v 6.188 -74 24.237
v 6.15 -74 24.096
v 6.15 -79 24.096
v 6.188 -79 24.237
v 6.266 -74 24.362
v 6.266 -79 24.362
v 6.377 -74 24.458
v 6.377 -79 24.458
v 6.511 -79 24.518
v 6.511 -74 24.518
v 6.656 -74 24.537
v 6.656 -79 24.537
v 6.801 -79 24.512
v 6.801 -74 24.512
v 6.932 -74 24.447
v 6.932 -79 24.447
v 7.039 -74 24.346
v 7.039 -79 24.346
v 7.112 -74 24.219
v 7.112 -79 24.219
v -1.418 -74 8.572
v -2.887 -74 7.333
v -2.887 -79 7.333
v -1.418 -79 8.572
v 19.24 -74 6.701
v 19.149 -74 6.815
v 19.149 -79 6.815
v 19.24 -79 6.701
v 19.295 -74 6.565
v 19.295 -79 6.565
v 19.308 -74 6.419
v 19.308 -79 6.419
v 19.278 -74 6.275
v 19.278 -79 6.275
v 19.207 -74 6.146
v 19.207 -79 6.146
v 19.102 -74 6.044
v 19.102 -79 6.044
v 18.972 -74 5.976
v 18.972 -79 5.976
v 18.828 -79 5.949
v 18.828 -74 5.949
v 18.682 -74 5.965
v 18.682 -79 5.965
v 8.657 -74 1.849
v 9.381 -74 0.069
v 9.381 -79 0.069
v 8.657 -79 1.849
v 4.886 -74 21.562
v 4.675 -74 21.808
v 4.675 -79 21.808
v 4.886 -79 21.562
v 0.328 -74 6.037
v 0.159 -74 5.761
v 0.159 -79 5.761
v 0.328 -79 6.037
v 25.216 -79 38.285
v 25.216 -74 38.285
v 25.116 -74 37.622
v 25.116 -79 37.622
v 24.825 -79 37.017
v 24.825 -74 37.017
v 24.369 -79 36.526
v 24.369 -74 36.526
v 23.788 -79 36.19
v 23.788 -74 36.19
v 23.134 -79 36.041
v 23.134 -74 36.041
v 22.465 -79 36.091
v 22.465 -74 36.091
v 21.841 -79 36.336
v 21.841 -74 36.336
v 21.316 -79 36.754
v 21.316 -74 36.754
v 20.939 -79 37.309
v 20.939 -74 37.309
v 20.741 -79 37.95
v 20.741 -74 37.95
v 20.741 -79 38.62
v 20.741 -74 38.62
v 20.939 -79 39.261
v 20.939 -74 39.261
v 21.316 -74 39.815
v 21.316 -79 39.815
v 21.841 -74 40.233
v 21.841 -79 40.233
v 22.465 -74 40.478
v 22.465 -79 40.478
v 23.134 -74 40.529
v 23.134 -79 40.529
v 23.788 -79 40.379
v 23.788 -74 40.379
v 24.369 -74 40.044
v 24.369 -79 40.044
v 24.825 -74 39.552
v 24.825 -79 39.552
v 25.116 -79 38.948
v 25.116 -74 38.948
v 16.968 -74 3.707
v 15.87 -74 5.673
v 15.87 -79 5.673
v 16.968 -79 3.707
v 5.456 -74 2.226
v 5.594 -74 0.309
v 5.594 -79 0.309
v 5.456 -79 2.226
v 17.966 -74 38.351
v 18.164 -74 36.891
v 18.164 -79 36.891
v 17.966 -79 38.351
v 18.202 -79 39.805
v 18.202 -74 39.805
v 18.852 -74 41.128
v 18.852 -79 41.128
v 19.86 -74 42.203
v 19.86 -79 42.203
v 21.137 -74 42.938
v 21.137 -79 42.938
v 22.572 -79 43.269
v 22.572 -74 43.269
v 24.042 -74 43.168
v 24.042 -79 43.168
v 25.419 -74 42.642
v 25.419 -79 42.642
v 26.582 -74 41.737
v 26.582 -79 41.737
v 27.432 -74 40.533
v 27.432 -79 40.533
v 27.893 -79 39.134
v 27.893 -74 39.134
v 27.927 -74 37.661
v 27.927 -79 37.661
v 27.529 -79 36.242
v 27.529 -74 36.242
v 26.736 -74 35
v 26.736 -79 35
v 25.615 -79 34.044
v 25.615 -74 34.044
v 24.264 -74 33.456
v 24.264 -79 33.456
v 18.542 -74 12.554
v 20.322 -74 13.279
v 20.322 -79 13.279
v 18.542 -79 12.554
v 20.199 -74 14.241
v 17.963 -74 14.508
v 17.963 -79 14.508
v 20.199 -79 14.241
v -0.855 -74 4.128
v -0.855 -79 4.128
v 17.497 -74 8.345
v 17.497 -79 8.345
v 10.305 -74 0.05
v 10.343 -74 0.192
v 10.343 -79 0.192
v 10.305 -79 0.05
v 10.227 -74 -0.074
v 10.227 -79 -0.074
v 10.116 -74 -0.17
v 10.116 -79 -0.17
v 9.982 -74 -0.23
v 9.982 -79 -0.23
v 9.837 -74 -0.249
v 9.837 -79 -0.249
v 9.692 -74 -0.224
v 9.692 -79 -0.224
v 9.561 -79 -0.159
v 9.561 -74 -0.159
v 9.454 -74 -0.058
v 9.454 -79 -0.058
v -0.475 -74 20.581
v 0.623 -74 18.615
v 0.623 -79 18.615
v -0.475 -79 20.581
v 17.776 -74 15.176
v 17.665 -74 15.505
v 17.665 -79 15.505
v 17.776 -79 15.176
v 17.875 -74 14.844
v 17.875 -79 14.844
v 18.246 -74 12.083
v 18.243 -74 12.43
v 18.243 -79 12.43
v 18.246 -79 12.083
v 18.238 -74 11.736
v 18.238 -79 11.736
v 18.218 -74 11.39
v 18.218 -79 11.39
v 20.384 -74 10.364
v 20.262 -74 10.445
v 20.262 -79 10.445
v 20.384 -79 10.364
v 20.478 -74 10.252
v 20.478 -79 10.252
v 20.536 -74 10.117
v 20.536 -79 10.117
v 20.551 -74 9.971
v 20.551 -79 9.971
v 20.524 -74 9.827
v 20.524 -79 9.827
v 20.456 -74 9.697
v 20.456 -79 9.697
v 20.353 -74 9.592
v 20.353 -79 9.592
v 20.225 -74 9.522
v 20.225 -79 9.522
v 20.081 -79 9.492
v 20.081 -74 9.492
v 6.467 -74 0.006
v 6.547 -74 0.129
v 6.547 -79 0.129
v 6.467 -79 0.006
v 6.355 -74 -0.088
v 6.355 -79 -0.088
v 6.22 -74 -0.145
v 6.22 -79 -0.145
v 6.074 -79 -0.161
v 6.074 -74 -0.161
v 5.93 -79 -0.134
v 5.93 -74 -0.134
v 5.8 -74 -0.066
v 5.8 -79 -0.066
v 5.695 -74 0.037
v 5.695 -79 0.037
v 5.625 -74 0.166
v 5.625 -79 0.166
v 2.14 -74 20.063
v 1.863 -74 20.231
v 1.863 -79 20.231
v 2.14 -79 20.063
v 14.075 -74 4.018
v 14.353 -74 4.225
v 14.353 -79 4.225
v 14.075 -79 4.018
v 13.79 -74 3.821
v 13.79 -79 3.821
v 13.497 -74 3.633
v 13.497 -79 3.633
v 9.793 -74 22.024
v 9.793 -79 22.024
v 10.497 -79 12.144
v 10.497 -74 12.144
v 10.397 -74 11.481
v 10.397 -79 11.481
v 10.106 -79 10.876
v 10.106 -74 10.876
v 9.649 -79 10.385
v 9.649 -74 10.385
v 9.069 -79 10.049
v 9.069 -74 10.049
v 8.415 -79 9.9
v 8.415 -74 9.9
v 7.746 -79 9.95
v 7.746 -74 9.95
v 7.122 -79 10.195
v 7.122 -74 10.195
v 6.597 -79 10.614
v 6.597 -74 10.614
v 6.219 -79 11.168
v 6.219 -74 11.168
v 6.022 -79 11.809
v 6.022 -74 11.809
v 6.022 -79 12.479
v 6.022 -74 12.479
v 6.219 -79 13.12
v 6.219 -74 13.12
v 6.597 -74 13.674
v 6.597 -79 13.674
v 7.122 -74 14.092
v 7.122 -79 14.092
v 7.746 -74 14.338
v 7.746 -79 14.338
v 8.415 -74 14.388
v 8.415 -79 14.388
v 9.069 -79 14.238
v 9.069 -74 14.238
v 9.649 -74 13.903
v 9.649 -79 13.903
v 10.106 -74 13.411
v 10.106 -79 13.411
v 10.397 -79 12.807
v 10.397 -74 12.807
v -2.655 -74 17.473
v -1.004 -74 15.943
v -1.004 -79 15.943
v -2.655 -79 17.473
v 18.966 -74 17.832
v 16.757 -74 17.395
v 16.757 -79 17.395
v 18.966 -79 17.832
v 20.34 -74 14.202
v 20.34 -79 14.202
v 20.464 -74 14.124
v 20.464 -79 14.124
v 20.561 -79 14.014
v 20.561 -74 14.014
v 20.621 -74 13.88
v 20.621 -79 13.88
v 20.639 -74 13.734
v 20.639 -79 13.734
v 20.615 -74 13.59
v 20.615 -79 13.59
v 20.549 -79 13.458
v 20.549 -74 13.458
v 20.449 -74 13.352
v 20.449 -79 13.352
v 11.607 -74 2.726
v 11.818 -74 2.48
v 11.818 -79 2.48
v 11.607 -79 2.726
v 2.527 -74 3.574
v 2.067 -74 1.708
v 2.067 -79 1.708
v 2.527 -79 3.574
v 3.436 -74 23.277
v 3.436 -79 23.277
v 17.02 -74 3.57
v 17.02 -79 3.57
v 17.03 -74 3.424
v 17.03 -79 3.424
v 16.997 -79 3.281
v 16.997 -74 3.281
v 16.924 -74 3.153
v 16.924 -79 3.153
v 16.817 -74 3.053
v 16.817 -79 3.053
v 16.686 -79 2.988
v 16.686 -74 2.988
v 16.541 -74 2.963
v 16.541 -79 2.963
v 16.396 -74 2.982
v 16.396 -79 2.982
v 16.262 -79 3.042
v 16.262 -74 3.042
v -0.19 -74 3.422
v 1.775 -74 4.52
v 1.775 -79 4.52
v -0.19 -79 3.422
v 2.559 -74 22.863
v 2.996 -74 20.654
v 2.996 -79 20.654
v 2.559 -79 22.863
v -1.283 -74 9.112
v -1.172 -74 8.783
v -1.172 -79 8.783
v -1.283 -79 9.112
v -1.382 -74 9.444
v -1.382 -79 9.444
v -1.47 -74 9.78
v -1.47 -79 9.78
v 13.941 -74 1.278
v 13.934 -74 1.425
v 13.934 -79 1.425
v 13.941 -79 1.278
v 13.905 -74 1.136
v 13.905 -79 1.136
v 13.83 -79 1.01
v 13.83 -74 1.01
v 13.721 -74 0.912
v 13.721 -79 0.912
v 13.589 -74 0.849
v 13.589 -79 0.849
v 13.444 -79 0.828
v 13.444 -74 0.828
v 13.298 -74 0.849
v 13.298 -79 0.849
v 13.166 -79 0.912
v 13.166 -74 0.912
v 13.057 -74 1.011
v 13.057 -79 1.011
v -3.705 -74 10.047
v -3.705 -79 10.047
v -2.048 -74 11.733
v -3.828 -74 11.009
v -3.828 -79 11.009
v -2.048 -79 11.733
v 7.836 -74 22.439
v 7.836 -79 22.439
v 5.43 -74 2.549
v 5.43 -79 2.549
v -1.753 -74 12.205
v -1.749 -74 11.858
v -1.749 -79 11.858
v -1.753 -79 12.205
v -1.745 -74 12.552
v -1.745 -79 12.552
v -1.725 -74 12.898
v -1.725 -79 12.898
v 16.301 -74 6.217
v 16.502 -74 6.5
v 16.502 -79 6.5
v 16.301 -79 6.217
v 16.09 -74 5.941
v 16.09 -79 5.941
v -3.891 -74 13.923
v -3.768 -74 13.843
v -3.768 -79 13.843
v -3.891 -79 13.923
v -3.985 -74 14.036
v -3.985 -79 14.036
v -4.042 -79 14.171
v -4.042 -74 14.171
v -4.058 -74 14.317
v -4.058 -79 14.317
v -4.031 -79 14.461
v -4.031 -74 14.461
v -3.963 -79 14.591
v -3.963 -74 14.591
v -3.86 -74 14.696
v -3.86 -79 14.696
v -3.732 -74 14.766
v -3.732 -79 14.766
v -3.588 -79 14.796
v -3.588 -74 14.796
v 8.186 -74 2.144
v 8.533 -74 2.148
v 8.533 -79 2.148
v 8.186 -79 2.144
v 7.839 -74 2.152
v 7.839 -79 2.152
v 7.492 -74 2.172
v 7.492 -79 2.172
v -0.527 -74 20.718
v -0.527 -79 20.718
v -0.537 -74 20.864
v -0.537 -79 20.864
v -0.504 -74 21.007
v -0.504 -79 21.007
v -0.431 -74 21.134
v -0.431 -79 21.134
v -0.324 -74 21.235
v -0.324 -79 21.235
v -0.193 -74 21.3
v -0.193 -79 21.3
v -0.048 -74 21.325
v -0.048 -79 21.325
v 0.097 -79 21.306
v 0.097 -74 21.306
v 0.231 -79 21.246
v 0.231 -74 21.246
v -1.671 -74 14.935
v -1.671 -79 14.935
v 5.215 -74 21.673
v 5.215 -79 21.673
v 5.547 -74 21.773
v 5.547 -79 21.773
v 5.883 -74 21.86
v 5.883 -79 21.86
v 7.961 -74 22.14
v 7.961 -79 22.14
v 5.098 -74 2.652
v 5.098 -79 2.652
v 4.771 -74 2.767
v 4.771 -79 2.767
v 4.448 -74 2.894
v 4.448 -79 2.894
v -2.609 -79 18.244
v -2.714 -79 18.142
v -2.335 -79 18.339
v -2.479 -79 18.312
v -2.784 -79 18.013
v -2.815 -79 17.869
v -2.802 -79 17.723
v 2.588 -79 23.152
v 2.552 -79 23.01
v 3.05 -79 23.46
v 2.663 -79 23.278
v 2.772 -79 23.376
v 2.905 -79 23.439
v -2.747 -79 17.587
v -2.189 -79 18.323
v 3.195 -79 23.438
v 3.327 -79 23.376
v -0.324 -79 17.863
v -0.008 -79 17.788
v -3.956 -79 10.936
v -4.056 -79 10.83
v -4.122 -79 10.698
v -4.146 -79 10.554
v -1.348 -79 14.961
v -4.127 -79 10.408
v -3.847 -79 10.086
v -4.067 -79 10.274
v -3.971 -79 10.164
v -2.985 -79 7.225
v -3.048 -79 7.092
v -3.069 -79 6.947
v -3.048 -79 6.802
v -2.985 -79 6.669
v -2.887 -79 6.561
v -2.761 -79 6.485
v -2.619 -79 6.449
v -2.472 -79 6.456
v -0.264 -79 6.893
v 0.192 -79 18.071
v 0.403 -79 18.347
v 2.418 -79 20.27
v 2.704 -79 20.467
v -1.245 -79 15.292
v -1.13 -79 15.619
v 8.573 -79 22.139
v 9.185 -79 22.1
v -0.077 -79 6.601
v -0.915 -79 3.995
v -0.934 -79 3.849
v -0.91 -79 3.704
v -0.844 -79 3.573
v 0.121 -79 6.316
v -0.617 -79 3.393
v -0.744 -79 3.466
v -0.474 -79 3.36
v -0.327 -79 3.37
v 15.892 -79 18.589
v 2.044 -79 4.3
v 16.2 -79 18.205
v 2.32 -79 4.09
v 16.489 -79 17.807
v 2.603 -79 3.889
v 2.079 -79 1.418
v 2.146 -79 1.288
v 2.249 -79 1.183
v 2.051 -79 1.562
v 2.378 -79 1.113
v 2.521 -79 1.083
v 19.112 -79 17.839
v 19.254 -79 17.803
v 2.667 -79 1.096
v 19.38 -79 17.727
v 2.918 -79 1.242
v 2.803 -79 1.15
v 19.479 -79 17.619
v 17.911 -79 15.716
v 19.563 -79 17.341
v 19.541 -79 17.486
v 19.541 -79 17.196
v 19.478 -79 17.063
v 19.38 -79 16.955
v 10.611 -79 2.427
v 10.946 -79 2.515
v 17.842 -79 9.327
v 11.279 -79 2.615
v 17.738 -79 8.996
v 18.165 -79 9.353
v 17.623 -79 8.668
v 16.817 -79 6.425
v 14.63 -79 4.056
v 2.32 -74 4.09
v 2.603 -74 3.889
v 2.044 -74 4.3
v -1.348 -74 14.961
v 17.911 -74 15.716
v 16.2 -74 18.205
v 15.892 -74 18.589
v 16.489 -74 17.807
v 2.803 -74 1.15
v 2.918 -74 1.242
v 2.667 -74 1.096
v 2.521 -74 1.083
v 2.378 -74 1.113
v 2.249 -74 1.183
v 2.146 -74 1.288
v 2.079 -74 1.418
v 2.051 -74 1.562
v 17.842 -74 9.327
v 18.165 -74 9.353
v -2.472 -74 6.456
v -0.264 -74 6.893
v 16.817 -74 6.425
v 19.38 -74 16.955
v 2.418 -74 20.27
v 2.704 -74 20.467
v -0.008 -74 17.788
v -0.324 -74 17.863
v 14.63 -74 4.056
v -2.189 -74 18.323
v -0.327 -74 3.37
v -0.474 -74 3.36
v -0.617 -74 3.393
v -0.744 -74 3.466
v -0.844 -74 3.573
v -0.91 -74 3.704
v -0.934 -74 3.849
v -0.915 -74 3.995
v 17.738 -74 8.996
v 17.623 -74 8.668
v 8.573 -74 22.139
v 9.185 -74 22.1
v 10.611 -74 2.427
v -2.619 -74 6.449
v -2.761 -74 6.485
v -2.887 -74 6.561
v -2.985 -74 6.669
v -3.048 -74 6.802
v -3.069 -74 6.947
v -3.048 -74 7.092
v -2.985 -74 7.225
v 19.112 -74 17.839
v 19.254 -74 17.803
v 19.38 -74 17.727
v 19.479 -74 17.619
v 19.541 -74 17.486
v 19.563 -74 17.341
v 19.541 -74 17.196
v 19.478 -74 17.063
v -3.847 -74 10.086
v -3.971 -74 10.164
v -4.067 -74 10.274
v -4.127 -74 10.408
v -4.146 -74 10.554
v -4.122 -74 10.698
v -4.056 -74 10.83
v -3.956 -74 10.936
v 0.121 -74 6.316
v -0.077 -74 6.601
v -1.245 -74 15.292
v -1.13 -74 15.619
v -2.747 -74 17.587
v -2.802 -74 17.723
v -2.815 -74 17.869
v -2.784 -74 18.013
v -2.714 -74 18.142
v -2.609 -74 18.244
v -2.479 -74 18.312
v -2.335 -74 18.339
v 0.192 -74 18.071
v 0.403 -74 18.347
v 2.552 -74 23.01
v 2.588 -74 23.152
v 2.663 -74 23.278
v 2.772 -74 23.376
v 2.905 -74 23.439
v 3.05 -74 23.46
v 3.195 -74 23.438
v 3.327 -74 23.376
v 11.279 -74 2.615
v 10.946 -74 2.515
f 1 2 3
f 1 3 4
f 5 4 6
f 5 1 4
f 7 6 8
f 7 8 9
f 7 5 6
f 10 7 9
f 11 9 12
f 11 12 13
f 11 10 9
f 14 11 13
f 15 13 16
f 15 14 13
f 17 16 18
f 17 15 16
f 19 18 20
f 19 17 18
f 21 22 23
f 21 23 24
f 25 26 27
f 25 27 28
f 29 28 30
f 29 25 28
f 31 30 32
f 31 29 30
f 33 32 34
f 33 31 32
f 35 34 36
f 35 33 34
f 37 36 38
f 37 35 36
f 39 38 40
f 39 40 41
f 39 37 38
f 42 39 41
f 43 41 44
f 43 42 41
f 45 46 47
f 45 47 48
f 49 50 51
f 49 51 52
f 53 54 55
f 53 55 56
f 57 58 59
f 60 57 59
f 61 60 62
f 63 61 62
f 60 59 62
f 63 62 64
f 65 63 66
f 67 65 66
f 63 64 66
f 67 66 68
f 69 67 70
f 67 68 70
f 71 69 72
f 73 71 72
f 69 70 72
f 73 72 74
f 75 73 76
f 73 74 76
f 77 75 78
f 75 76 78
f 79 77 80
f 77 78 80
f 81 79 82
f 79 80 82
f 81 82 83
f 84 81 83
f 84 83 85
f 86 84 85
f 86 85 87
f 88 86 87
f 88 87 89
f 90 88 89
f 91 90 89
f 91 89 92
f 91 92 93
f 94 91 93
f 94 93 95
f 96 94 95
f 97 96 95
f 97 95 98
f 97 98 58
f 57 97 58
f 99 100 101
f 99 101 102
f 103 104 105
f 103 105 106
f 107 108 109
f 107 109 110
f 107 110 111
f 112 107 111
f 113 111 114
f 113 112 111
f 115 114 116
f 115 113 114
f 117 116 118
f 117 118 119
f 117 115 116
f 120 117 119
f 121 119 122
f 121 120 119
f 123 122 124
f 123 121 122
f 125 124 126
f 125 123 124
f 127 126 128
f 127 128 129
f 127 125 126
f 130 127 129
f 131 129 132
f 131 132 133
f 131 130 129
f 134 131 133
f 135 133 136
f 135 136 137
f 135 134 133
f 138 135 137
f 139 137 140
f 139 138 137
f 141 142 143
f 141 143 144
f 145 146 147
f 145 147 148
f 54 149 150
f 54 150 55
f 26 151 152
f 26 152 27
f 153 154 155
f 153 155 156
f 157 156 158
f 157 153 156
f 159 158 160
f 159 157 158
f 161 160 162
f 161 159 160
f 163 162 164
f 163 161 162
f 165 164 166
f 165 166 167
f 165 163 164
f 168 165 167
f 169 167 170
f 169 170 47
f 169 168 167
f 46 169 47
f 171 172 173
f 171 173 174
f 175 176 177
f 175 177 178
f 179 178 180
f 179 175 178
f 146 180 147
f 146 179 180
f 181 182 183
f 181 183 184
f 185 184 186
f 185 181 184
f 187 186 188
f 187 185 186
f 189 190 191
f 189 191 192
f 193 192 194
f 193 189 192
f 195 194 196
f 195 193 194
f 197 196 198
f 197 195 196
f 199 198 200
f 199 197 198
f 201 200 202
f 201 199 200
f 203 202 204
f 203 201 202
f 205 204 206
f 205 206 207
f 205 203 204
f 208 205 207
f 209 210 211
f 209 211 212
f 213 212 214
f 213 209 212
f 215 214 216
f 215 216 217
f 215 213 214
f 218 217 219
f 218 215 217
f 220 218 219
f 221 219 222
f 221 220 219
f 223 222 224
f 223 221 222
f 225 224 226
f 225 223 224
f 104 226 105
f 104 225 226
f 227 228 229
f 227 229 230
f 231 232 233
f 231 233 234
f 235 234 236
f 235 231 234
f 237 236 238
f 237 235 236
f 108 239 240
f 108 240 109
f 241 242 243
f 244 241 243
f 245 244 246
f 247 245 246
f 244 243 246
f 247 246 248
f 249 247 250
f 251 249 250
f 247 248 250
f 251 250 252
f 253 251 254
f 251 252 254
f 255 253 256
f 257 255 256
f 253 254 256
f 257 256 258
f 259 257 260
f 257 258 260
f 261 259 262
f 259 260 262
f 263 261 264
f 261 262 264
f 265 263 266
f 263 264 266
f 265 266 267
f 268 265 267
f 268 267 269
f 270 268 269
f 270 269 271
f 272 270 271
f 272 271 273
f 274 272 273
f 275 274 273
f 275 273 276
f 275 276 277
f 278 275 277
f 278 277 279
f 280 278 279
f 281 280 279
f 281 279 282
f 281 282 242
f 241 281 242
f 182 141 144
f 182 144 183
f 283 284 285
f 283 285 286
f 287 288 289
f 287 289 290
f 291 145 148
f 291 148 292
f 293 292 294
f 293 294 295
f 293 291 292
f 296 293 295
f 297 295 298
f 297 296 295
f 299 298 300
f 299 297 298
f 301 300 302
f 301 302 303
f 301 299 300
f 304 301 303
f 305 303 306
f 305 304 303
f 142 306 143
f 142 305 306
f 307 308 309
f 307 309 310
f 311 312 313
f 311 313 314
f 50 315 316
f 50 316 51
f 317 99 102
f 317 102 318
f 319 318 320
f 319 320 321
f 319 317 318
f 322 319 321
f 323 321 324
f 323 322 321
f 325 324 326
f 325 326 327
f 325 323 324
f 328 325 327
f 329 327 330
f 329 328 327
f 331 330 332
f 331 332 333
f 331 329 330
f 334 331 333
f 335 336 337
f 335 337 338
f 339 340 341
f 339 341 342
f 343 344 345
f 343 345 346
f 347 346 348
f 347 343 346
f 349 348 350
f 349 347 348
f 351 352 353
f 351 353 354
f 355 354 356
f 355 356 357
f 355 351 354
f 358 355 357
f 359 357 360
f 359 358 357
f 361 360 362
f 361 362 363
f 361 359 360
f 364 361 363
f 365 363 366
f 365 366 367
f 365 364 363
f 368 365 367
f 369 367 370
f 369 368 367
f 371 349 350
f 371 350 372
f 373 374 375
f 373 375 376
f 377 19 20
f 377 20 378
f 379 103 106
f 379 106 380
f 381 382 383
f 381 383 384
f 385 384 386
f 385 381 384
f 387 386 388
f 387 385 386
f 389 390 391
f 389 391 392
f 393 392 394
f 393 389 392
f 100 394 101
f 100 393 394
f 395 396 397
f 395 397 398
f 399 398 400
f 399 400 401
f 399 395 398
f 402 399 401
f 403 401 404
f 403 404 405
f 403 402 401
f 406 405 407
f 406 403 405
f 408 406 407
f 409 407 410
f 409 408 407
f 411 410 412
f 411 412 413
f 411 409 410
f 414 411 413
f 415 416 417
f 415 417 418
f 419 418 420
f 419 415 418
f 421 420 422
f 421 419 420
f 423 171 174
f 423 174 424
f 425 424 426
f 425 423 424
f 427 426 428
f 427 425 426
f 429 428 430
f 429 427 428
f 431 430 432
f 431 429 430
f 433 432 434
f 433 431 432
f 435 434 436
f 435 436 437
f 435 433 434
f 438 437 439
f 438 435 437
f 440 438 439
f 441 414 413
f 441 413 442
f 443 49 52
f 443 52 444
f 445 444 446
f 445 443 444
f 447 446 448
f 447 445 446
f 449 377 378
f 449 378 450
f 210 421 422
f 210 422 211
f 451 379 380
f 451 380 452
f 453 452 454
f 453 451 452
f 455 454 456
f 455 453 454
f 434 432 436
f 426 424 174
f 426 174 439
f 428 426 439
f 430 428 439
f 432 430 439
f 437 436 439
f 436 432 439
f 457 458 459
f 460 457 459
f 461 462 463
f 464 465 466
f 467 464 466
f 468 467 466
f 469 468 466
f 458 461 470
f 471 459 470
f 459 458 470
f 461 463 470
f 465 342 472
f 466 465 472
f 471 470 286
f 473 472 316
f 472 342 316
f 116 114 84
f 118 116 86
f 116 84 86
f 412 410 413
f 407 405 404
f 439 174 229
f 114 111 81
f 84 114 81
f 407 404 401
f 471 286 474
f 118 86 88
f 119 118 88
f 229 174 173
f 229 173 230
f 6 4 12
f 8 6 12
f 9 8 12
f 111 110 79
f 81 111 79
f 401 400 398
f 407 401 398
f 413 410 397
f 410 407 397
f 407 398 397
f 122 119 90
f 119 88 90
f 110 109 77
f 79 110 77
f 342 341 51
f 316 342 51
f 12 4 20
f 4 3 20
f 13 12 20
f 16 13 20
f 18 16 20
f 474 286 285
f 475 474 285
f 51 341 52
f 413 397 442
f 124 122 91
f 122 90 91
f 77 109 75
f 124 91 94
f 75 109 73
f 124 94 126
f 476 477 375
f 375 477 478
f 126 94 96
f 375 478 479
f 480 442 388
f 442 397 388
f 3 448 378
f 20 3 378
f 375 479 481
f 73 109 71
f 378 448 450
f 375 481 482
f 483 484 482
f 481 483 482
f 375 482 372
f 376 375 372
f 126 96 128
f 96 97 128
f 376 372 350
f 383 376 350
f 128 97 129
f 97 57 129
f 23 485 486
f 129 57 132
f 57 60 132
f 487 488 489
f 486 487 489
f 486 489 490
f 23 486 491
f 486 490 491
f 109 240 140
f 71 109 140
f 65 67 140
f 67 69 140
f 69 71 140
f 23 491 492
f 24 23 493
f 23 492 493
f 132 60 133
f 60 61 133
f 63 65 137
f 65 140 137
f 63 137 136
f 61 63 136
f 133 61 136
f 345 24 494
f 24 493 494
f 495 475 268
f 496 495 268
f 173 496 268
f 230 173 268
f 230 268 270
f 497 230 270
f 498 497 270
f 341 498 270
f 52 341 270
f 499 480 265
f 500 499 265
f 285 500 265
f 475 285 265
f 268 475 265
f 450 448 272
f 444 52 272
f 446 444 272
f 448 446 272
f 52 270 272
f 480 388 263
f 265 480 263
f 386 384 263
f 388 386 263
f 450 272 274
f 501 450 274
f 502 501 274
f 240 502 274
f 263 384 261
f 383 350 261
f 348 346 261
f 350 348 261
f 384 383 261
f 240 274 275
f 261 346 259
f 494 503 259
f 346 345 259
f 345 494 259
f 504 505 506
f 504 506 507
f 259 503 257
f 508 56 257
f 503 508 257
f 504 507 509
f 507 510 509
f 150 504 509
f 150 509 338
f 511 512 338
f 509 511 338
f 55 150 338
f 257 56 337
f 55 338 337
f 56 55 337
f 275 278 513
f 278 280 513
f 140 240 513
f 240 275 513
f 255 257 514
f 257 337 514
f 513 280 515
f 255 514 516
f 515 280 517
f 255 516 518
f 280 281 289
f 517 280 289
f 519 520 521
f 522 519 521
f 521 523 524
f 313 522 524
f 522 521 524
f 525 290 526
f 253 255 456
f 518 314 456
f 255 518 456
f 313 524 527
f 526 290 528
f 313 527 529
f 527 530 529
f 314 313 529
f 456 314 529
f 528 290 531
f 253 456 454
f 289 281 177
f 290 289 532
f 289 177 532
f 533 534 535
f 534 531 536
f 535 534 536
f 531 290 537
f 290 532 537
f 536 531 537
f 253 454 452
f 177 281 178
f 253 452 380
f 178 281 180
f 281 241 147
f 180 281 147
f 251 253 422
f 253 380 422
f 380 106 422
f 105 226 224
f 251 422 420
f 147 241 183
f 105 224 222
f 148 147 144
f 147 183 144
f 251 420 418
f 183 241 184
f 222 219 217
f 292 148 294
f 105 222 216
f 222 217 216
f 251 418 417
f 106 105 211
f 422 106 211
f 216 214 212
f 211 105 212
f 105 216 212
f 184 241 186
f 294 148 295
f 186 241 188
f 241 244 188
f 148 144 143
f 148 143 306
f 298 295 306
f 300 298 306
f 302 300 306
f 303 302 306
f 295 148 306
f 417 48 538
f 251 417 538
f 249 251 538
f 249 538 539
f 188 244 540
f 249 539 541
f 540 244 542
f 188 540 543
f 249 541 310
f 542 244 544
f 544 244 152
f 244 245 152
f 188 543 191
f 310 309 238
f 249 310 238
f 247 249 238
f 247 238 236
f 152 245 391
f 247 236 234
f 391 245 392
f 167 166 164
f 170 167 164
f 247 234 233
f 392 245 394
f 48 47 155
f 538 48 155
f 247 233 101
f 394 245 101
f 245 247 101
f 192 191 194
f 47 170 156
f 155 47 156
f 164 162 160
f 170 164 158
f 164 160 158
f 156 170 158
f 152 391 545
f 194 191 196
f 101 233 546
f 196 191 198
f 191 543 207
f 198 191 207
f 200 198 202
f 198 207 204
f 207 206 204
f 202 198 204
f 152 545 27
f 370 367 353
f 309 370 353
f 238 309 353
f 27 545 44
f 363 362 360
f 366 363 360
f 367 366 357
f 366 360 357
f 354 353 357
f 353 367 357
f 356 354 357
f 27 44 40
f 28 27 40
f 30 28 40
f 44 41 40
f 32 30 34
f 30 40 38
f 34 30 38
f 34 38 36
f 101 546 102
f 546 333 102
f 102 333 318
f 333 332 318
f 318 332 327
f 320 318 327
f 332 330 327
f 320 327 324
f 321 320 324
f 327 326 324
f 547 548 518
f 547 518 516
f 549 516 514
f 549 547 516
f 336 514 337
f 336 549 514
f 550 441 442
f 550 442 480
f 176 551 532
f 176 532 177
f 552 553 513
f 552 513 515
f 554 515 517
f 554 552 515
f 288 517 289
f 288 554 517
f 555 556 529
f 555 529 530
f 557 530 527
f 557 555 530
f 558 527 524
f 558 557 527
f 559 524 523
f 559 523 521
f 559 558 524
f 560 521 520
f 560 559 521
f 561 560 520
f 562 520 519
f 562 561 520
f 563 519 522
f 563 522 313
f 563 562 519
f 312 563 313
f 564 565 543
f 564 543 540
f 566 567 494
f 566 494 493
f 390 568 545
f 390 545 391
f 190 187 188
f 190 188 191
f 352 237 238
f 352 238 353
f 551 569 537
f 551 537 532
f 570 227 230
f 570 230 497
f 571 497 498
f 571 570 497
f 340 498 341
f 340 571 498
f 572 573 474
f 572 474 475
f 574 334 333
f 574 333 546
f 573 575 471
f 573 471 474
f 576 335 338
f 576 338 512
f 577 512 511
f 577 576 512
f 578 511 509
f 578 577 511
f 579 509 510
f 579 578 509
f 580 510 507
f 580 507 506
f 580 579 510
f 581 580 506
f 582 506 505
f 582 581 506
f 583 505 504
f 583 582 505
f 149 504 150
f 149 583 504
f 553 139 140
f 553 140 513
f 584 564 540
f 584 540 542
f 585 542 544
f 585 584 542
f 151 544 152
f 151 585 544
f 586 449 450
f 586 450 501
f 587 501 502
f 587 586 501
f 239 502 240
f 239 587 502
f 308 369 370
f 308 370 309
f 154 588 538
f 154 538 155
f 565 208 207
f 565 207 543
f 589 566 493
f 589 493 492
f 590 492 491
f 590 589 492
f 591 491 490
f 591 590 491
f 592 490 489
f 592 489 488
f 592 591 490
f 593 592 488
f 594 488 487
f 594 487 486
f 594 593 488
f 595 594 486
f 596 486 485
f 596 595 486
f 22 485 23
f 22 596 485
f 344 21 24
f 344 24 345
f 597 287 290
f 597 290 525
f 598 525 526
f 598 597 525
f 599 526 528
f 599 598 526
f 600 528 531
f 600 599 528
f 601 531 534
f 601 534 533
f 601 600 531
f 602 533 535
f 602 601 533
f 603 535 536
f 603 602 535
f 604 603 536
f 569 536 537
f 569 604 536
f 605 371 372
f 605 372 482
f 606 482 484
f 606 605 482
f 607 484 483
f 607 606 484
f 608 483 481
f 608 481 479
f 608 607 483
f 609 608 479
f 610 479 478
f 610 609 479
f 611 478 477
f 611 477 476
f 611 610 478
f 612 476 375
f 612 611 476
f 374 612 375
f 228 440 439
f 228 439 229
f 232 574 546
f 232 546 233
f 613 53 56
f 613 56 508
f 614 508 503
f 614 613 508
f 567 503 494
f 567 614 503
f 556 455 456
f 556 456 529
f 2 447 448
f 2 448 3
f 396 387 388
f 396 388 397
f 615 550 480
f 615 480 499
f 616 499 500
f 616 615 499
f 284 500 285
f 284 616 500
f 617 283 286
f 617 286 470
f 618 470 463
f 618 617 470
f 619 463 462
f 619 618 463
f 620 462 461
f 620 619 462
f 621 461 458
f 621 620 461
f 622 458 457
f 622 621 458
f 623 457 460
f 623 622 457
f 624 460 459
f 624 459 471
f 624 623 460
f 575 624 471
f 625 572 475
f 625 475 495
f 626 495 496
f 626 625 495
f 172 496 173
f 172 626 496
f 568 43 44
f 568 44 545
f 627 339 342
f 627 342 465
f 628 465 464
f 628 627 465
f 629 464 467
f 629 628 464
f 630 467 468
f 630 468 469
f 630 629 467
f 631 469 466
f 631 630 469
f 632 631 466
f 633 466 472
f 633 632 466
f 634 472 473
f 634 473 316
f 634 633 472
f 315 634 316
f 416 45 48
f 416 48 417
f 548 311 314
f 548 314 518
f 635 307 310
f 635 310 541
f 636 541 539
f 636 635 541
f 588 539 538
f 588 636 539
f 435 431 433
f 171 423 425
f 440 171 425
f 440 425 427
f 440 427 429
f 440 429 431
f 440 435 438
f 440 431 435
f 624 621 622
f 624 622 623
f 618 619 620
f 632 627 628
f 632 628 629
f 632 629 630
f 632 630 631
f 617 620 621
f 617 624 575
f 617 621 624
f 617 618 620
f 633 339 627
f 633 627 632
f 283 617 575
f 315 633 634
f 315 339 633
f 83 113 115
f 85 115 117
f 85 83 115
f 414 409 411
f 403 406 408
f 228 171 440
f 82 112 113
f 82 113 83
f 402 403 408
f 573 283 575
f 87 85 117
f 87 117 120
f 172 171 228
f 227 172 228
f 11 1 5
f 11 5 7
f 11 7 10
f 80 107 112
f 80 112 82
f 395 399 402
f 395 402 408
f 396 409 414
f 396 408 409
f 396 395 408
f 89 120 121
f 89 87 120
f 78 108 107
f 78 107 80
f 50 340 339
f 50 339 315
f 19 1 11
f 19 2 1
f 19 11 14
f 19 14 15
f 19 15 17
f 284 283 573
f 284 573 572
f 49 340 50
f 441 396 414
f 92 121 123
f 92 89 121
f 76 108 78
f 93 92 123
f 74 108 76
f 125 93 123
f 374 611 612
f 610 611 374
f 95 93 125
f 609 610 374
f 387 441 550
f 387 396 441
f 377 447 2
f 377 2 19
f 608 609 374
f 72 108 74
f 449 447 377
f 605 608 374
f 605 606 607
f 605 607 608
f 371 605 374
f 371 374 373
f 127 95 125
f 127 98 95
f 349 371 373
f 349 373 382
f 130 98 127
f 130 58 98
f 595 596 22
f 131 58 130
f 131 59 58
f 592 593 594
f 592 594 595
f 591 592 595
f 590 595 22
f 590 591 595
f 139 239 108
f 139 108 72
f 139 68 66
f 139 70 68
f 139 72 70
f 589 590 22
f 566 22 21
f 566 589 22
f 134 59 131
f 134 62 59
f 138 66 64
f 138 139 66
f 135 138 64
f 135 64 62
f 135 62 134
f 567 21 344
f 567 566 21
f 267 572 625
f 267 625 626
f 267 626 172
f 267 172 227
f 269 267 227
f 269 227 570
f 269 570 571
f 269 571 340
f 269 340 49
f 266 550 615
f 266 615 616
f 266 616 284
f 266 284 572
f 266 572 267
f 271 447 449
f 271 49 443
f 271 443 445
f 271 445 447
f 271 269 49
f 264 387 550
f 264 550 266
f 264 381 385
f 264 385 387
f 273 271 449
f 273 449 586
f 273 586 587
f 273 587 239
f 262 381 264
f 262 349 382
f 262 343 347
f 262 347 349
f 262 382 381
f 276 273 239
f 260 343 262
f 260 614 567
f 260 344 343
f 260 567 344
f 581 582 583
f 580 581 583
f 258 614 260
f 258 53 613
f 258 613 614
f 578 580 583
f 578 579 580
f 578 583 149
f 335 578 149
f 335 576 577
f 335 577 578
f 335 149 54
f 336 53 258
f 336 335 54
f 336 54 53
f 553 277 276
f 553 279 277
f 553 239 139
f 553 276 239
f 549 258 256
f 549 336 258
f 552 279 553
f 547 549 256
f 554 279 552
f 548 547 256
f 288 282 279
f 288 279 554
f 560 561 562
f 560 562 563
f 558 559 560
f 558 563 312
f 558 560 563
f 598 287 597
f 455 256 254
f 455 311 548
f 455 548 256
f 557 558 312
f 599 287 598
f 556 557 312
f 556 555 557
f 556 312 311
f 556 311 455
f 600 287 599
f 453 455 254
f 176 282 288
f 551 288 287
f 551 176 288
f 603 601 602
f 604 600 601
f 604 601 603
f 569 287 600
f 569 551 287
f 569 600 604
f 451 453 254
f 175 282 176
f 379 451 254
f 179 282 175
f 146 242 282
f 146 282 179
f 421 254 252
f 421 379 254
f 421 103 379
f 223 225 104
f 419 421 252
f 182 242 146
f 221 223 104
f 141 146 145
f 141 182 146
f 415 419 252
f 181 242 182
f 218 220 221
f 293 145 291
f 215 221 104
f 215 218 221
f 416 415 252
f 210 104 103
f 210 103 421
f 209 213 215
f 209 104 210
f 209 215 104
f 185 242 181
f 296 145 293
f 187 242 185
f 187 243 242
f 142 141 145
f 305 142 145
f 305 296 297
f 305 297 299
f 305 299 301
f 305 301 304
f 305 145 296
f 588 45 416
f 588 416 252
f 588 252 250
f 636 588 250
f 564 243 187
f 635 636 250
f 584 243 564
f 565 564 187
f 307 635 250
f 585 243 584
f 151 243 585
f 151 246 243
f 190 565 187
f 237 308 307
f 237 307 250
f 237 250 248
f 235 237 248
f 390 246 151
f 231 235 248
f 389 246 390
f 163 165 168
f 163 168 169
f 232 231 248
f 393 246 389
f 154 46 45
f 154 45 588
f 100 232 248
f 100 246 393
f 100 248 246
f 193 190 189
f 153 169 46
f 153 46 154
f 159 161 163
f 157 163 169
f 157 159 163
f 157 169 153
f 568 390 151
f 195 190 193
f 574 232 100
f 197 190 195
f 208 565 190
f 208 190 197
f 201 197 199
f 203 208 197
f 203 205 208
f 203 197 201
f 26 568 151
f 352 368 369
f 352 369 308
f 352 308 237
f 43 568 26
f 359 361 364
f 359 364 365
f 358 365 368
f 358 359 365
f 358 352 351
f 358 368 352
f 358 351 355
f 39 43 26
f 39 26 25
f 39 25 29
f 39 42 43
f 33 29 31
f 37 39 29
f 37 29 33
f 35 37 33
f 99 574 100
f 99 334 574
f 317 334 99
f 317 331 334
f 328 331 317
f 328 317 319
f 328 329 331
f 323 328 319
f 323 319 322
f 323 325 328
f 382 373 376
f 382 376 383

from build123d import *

# Parameters (mm, degrees)
BOSS_EXTRUDE1_DEPTH        = 5
F_4_5_4_5_DIAMETER_HOLE1_D = 4.5


with BuildPart() as part:
    # Sketch1 → Boss-Extrude1 (new body)
    with BuildSketch(Plane(origin=(0, -74, 0), x_dir=(1, 0, 0), z_dir=(0, 1, 0))):
        with BuildLine():
            Line((9.792858273, -22.023664764), (18.163987442, -36.890703242))
            ThreePointArc((18.163987442, -36.890703242), (25.418865109, -42.641693781), (24.263539525, -33.456250682))
            Line((24.263539525, -33.456250682), (15.892410356, -18.589212204))
            ThreePointArc((15.892410356, -18.589212204), (16.346796769, -18.007963525), (16.757092444, -17.394795929))
            Line((16.757092444, -17.394795929), (18.965700238, -17.831555144))
            ThreePointArc((18.965700238, -17.831555144), (19.514808102, -17.55458812), (19.379909826, -16.954560925))
            Line((19.379909826, -16.954560925), (17.910889228, -15.715657441))
            Line((17.910889228, -15.715657441), (17.664910308, -15.504807423))
            ThreePointArc((17.664910308, -15.504807423), (17.827013037, -15.010242888), (17.963165175, -14.507914341))
            Line((17.963165175, -14.507914341), (20.19864203, -14.240799695))
            ThreePointArc((20.19864203, -14.240799695), (20.635287125, -13.80770474), (20.32157264, -13.278730827))
            Line((20.32157264, -13.278730827), (18.541608797, -12.554415925))
            Line((18.541608797, -12.554415925), (18.242512703, -12.429897308))
            ThreePointArc((18.242512703, -12.429897308), (18.243852713, -11.909445986), (18.218113034, -11.389629824))
            Line((18.218113034, -11.389629824), (20.261634899, -10.444788361))
            ThreePointArc((20.261634899, -10.444788361), (20.543075361, -9.897959827), (20.081253227, -9.491818847))
            Line((20.081253227, -9.491818847), (18.164581401, -9.352993516))
            Line((18.164581401, -9.352993516), (17.841645743, -9.32699505))
            ThreePointArc((17.841645743, -9.32699505), (17.682091866, -8.831602343), (17.496979948, -8.345181793))
            Line((17.496979948, -8.345181793), (19.148512665, -6.815101178))
            ThreePointArc((19.148512665, -6.815101178), (19.247199139, -6.208066452), (18.682475725, -5.964514314))
            Line((18.682475725, -5.964514314), (16.816713109, -6.424767746))
            Line((16.816713109, -6.424767746), (16.501549079, -6.499834341))
            ThreePointArc((16.501549079, -6.499834341), (16.196719559, -6.077992739), (15.870355447, -5.672582033))
            Line((15.870355447, -5.672582033), (16.968235486, -3.707037218))
            ThreePointArc((16.968235486, -3.707037218), (16.874507855, -3.099217089), (16.262162222, -3.042094373))
            Line((16.262162222, -3.042094373), (14.62994266, -4.056373754))
            Line((14.62994266, -4.056373754), (14.353400709, -4.22515737))
            ThreePointArc((14.353400709, -4.22515737), (13.933134384, -3.918159668), (13.497464871, -3.633443231))
            Line((13.497464871, -3.633443231), (13.934224085, -1.424835437))
            ThreePointArc((13.934224085, -1.424835437), (13.657257061, -0.875727573), (13.057229867, -1.010625848))
            Line((13.057229867, -1.010625848), (11.818326382, -2.479646446))
            Line((11.818326382, -2.479646446), (11.607476364, -2.725625367))
            ThreePointArc((11.607476364, -2.725625367), (11.112911829, -2.563522638), (10.610583282, -2.427370499))
            Line((10.610583282, -2.427370499), (10.343468637, -0.191893645))
            ThreePointArc((10.343468637, -0.191893645), (9.910373682, 0.24475145), (9.381399768, -0.068963034))
            Line((9.381399768, -0.068963034), (8.657084866, -1.848926878))
            Line((8.657084866, -1.848926878), (8.532566249, -2.148022972))
            ThreePointArc((8.532566249, -2.148022972), (8.012114927, -2.146682961), (7.492298765, -2.17242264))
            Line((7.492298765, -2.17242264), (6.547457302, -0.128900776))
            ThreePointArc((6.547457302, -0.128900776), (6.000628768, 0.152539686), (5.594487788, -0.309282448))
            Line((5.594487788, -0.309282448), (5.455662457, -2.225954274))
            Line((5.455662457, -2.225954274), (5.429663991, -2.548889932))
            ThreePointArc((5.429663991, -2.548889932), (4.934271284, -2.708443809), (4.447850734, -2.893555727))
            Line((4.447850734, -2.893555727), (2.917770119, -1.24202301))
            ThreePointArc((2.917770119, -1.24202301), (2.310735394, -1.143336536), (2.067183255, -1.70805995))
            Line((2.067183255, -1.70805995), (2.527436687, -3.573822566))
            Line((2.527436687, -3.573822566), (2.602503283, -3.888986596))
            ThreePointArc((2.602503283, -3.888986596), (2.18066168, -4.193816116), (1.775250975, -4.520180228))
            Line((1.775250975, -4.520180228), (-0.19029384, -3.422300189))
            ThreePointArc((-0.19029384, -3.422300189), (-0.79811397, -3.51602782), (-0.855236686, -4.128373453))
            Line((-0.855236686, -4.128373453), (0.159042695, -5.760593015))
            Line((0.159042695, -5.760593015), (0.327826311, -6.037134965))
            ThreePointArc((0.327826311, -6.037134965), (0.020828609, -6.457401291), (-0.263887828, -6.893070804))
            Line((-0.263887828, -6.893070804), (-2.472495622, -6.45631159))
            ThreePointArc((-2.472495622, -6.45631159), (-3.021603486, -6.733278614), (-2.88670521, -7.333305808))
            Line((-2.88670521, -7.333305808), (-1.417684612, -8.572209293))
            Line((-1.417684612, -8.572209293), (-1.171705692, -8.783059311))
            ThreePointArc((-1.171705692, -8.783059311), (-1.333808421, -9.277623846), (-1.469960559, -9.779952393))
            Line((-1.469960559, -9.779952393), (-3.705437414, -10.047067038))
            ThreePointArc((-3.705437414, -10.047067038), (-4.142082509, -10.480161993), (-3.828368024, -11.009135907))
            Line((-3.828368024, -11.009135907), (-2.048404181, -11.733450809))
            Line((-2.048404181, -11.733450809), (-1.749308087, -11.857969426))
            ThreePointArc((-1.749308087, -11.857969426), (-1.750648097, -12.378420747), (-1.724908418, -12.89823691))
            Line((-1.724908418, -12.89823691), (-3.768430283, -13.843078373))
            ThreePointArc((-3.768430283, -13.843078373), (-4.049870744, -14.389906907), (-3.588048611, -14.796047887))
            Line((-3.588048611, -14.796047887), (-1.671376785, -14.934873217))
            Line((-1.671376785, -14.934873217), (-1.348441127, -14.960871684))
            ThreePointArc((-1.348441127, -14.960871684), (-1.188887249, -15.45626439), (-1.003775332, -15.942684941))
            Line((-1.003775332, -15.942684941), (-2.655308048, -17.472765555))
            ThreePointArc((-2.655308048, -17.472765555), (-2.753994523, -18.079800281), (-2.189271109, -18.32335242))
            Line((-2.189271109, -18.32335242), (-0.323508493, -17.863098988))
            Line((-0.323508493, -17.863098988), (-0.008344463, -17.788032392))
            ThreePointArc((-0.008344463, -17.788032392), (0.296485057, -18.209873994), (0.622849169, -18.6152847))
            Line((0.622849169, -18.6152847), (-0.47503087, -20.580829515))
            ThreePointArc((-0.47503087, -20.580829515), (-0.381303238, -21.188649645), (0.231042394, -21.245772361))
            Line((0.231042394, -21.245772361), (1.863261956, -20.23149298))
            Line((1.863261956, -20.23149298), (2.139803907, -20.062709363))
            ThreePointArc((2.139803907, -20.062709363), (2.560070232, -20.369707066), (2.995739745, -20.654423502))
            Line((2.995739745, -20.654423502), (2.558980531, -22.863031297))
            ThreePointArc((2.558980531, -22.863031297), (2.835947555, -23.412139161), (3.43597475, -23.277240885))
            Line((3.43597475, -23.277240885), (4.674878234, -21.808220287))
            Line((4.674878234, -21.808220287), (4.885728252, -21.562241367))
            ThreePointArc((4.885728252, -21.562241367), (5.380292787, -21.724344095), (5.882621334, -21.860496234))
            Line((5.882621334, -21.860496234), (6.149735979, -24.095973089))
            ThreePointArc((6.149735979, -24.095973089), (6.582830934, -24.532618183), (7.111804848, -24.218903699))
            Line((7.111804848, -24.218903699), (7.83611975, -22.438939856))
            Line((7.83611975, -22.438939856), (7.960638367, -22.139843762))
            ThreePointArc((7.960638367, -22.139843762), (8.879420123, -22.123890361), (9.792858273, -22.023664764))
        make_face()
    extrude(amount=-BOSS_EXTRUDE1_DEPTH)

    # Ø4.5 (4.5) Diameter Hole1 (through all)
    with Locations(Plane(origin=(0, -79, 0), x_dir=(-1, 0, 0), z_dir=(0, -1, 0))):
        with Locations((-22.965684708, -38.284870865), (-8.246602308, -12.143933367)):
            Hole(F_4_5_4_5_DIAMETER_HOLE1_D / 2)


solid = part.part
